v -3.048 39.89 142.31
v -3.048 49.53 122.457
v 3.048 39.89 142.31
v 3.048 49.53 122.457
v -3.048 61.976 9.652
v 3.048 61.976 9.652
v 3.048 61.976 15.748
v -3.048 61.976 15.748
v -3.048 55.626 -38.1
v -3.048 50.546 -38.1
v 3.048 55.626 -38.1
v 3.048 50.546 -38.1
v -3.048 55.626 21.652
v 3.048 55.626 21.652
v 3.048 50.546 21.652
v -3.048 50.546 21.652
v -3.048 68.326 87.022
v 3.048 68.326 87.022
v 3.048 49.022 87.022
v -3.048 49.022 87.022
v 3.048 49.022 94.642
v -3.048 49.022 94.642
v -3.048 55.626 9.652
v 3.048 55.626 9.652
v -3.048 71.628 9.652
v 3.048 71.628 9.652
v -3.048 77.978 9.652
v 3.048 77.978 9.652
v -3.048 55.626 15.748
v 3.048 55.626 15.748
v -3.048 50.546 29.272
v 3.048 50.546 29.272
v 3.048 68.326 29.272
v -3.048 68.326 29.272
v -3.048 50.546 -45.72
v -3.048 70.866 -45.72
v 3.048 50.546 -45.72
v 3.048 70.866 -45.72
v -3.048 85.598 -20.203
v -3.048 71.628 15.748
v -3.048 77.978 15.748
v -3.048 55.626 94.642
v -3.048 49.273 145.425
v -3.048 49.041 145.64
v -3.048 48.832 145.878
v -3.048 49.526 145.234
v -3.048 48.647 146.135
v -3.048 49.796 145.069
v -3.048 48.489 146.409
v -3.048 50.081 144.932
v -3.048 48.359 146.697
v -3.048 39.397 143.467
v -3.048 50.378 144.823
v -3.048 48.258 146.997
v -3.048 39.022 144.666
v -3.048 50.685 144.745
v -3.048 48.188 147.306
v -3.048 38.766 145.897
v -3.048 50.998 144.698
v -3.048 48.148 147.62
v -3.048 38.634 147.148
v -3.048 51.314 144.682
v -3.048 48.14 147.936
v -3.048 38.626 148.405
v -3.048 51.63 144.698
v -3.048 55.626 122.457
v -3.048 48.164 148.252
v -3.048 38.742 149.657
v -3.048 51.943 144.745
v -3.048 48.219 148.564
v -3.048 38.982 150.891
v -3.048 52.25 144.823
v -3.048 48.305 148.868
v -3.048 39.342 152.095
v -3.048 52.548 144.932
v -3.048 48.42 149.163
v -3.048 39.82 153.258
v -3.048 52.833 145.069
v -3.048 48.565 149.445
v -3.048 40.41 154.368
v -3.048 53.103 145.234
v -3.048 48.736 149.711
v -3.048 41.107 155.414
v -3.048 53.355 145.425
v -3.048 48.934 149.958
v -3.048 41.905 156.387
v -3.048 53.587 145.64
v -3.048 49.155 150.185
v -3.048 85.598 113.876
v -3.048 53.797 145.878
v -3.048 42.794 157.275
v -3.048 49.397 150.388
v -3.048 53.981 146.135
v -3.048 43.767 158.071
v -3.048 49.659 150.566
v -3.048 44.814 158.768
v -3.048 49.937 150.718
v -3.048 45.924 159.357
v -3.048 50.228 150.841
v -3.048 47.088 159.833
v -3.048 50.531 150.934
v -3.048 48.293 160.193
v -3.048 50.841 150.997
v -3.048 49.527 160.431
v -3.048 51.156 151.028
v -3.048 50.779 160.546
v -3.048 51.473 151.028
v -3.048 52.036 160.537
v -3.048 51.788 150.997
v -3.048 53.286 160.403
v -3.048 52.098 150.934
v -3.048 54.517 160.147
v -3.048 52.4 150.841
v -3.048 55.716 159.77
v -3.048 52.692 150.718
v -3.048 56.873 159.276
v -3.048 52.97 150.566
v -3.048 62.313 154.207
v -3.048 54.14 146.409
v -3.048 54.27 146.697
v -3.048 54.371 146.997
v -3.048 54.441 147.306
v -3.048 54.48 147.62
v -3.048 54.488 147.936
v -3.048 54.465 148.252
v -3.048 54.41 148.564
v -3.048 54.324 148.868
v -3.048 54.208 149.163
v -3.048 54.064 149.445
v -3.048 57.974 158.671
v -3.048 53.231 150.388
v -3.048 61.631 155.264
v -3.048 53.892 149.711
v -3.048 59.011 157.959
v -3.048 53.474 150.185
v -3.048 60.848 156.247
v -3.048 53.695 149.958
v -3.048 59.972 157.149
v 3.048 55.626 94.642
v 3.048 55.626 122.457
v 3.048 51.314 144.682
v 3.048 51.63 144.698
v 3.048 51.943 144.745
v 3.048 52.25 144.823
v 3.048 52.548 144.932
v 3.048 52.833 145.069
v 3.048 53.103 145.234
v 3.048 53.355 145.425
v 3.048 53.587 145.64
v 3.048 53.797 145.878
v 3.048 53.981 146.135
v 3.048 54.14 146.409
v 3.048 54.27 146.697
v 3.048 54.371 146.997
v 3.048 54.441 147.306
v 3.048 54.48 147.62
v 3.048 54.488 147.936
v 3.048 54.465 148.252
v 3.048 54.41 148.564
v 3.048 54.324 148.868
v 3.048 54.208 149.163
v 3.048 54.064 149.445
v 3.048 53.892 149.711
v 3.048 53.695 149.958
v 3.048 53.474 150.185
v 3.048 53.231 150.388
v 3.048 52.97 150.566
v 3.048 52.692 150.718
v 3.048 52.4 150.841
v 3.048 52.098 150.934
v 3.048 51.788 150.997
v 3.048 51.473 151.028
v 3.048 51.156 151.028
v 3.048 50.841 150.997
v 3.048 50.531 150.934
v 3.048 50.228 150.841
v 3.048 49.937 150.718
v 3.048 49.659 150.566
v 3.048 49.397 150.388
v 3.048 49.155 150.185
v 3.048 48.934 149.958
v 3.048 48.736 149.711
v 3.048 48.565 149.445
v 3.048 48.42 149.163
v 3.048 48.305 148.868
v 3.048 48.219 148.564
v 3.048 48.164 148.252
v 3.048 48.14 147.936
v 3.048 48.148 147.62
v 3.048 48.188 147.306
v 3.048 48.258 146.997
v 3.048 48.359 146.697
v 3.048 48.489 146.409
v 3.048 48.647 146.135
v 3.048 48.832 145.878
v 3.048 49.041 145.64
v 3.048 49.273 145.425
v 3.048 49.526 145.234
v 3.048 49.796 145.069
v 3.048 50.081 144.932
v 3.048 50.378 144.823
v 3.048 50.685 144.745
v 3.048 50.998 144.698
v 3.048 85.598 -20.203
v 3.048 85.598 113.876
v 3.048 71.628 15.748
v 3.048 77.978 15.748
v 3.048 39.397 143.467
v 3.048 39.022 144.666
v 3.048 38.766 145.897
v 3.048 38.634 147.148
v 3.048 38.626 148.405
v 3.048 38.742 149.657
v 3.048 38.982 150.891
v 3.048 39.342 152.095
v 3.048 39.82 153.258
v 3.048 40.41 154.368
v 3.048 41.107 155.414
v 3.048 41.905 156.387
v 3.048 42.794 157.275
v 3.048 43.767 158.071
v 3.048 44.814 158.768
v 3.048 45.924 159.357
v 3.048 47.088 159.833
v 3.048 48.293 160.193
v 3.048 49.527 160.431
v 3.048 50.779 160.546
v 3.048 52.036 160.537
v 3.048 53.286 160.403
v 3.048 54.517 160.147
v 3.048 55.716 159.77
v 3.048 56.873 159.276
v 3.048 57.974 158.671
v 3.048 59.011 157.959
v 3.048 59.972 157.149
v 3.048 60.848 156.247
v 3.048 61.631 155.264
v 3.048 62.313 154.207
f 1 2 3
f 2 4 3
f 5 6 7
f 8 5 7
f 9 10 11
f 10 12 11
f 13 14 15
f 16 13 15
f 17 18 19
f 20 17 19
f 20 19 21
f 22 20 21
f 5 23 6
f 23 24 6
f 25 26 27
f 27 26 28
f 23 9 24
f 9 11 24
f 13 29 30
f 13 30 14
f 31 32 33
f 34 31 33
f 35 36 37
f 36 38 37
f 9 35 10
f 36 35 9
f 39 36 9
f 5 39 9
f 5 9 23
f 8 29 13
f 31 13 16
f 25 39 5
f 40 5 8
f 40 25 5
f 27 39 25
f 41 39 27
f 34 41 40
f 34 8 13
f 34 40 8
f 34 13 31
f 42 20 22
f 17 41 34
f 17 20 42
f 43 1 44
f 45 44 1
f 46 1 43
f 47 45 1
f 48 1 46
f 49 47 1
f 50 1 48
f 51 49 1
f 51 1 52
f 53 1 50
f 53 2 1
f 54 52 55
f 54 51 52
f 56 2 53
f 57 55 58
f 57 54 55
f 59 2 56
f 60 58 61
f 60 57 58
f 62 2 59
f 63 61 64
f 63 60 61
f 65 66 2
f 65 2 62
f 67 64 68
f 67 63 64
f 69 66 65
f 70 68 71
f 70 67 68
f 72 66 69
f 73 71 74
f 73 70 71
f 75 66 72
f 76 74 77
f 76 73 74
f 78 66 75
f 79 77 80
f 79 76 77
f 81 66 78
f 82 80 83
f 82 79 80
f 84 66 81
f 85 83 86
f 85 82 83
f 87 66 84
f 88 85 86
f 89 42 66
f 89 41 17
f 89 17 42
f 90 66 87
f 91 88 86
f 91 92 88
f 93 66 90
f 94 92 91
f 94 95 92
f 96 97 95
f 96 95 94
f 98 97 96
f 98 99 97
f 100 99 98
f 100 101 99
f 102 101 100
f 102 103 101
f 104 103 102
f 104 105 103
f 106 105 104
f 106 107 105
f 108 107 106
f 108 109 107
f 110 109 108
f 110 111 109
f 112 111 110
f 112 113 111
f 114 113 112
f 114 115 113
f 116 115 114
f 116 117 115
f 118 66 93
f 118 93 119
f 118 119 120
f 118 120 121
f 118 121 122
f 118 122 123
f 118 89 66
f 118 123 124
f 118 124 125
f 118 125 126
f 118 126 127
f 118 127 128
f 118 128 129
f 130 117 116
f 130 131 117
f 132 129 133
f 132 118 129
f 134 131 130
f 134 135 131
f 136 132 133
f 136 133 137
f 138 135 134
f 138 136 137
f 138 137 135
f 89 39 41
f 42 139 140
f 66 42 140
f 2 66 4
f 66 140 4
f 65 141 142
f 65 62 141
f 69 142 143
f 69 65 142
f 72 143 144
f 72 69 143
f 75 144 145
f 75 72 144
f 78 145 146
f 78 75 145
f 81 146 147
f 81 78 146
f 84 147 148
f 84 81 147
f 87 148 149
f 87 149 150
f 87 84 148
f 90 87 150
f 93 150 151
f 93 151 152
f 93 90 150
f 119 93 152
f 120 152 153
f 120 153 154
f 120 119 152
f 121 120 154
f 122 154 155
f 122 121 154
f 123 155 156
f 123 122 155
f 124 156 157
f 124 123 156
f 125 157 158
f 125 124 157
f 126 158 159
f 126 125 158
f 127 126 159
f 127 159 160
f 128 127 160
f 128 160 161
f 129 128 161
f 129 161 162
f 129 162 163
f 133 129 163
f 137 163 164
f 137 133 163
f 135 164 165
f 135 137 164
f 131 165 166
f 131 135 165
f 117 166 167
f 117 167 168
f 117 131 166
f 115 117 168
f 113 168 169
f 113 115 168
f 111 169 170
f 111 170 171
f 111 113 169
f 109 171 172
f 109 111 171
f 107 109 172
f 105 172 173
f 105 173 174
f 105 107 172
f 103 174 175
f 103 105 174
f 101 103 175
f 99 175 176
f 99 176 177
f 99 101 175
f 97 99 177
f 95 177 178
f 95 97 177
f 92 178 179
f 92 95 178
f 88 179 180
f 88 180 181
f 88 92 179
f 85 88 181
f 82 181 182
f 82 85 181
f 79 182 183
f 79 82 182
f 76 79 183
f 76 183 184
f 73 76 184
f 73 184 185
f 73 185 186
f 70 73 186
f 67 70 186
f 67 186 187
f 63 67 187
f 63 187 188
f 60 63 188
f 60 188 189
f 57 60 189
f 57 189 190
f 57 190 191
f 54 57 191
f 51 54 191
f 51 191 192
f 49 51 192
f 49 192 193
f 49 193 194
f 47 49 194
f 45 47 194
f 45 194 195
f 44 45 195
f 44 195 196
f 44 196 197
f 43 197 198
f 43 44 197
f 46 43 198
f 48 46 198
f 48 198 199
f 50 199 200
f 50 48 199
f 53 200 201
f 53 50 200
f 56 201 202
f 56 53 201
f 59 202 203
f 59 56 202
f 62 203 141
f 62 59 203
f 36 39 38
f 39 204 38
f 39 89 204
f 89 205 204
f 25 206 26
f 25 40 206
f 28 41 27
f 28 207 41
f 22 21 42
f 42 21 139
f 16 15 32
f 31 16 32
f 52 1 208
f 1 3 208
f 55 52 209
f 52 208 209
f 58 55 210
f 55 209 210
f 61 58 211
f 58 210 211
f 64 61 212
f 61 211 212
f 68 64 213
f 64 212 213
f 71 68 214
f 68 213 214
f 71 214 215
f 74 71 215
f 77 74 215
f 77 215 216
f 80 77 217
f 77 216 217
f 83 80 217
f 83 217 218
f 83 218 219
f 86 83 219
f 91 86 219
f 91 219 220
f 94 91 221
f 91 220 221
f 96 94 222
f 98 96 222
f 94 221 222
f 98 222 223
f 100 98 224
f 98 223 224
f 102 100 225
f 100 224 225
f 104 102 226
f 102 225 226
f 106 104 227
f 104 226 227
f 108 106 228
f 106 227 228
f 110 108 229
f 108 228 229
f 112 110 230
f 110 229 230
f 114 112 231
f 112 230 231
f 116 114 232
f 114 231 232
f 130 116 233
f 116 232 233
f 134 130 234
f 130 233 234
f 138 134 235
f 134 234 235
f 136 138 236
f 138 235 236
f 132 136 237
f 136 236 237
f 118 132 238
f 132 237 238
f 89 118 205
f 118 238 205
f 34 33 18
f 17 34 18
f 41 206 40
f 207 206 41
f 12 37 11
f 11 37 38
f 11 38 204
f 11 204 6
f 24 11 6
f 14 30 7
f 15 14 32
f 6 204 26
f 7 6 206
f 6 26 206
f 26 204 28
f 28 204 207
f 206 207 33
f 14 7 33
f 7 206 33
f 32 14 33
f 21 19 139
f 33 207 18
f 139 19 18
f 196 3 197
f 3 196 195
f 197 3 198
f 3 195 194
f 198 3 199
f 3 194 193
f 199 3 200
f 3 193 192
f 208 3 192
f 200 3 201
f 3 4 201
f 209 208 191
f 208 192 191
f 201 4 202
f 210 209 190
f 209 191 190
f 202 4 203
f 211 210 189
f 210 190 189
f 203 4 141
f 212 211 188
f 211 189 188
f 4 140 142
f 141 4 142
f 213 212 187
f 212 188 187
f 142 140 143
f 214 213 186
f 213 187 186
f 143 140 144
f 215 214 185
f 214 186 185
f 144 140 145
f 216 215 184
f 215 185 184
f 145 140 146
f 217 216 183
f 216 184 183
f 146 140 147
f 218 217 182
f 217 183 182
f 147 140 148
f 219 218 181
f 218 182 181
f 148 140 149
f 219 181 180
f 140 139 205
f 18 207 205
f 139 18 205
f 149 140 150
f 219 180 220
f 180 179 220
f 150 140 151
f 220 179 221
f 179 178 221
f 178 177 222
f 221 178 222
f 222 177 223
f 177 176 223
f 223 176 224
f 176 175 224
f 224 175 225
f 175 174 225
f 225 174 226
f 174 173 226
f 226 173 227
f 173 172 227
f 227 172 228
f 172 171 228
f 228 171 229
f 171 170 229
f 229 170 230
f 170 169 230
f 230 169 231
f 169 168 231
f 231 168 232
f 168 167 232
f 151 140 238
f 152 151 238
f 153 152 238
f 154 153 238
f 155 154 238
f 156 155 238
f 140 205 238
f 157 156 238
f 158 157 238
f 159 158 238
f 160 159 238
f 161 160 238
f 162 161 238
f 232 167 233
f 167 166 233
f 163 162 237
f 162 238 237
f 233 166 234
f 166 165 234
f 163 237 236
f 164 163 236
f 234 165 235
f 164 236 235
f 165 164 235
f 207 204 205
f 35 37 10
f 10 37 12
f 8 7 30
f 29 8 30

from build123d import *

# Parameters (mm, degrees)
SKETCH1_R           = 3.175
SKETCH1_W           = 6.096
SKETCH1_H           = 6.35
BOSS_EXTRUDE1_DEPTH = 3.048


with BuildPart() as part:
    # Sketch1 → Boss-Extrude1 (new, symmetric)
    with BuildSketch(Plane(origin=(0, 0, 0), x_dir=(0, 0, -1), z_dir=(1, 0, 0))):
        with BuildLine():
            Line((-94.642365809, 55.626), (-122.457292876, 55.626))
            Line((-122.457292876, 55.626), (-122.457292876, 49.53))
            Line((-122.457292876, 49.53), (-142.309833129, 39.889958968))
            ThreePointArc((-142.309833129, 39.889958968), (-159.075906045, 45.361766519), (-154.207292876, 62.312827982))
            Line((-154.207292876, 62.312827982), (-113.876191878, 85.598))
            Line((-113.876191878, 85.598), (20.203427503, 85.598))
            Line((20.203427503, 85.598), (45.72, 70.866))
            Line((45.72, 70.866), (45.72, 50.546))
            Line((45.72, 50.546), (38.1, 50.546))
            Line((38.1, 50.546), (38.1, 55.626))
            Line((38.1, 55.626), (-9.652, 55.626))
            Line((-9.652, 55.626), (-9.652, 61.976))
            Line((-9.652, 61.976), (-15.748, 61.976))
            Line((-15.748, 61.976), (-15.748, 55.626))
            Line((-15.748, 55.626), (-21.651856626, 55.626))
            Line((-21.651856626, 55.626), (-21.651856626, 50.546))
            Line((-21.651856626, 50.546), (-29.271856626, 50.546))
            Line((-29.271856626, 50.546), (-29.271856626, 68.326))
            Line((-29.271856626, 68.326), (-87.022365809, 68.326))
            Line((-87.022365809, 68.326), (-87.022365809, 49.022))
            Line((-87.022365809, 49.022), (-94.642365809, 49.022))
            Line((-94.642365809, 49.022), (-94.642365809, 55.626))
        make_face()
        with Locations((-147.857292876, 51.314305354)):
            Circle(SKETCH1_R, mode=Mode.SUBTRACT)
        with Locations((-12.7, 74.803)):
            Rectangle(SKETCH1_W, SKETCH1_H, mode=Mode.SUBTRACT)
    extrude(amount=BOSS_EXTRUDE1_DEPTH, both=True)


solid = part.part
